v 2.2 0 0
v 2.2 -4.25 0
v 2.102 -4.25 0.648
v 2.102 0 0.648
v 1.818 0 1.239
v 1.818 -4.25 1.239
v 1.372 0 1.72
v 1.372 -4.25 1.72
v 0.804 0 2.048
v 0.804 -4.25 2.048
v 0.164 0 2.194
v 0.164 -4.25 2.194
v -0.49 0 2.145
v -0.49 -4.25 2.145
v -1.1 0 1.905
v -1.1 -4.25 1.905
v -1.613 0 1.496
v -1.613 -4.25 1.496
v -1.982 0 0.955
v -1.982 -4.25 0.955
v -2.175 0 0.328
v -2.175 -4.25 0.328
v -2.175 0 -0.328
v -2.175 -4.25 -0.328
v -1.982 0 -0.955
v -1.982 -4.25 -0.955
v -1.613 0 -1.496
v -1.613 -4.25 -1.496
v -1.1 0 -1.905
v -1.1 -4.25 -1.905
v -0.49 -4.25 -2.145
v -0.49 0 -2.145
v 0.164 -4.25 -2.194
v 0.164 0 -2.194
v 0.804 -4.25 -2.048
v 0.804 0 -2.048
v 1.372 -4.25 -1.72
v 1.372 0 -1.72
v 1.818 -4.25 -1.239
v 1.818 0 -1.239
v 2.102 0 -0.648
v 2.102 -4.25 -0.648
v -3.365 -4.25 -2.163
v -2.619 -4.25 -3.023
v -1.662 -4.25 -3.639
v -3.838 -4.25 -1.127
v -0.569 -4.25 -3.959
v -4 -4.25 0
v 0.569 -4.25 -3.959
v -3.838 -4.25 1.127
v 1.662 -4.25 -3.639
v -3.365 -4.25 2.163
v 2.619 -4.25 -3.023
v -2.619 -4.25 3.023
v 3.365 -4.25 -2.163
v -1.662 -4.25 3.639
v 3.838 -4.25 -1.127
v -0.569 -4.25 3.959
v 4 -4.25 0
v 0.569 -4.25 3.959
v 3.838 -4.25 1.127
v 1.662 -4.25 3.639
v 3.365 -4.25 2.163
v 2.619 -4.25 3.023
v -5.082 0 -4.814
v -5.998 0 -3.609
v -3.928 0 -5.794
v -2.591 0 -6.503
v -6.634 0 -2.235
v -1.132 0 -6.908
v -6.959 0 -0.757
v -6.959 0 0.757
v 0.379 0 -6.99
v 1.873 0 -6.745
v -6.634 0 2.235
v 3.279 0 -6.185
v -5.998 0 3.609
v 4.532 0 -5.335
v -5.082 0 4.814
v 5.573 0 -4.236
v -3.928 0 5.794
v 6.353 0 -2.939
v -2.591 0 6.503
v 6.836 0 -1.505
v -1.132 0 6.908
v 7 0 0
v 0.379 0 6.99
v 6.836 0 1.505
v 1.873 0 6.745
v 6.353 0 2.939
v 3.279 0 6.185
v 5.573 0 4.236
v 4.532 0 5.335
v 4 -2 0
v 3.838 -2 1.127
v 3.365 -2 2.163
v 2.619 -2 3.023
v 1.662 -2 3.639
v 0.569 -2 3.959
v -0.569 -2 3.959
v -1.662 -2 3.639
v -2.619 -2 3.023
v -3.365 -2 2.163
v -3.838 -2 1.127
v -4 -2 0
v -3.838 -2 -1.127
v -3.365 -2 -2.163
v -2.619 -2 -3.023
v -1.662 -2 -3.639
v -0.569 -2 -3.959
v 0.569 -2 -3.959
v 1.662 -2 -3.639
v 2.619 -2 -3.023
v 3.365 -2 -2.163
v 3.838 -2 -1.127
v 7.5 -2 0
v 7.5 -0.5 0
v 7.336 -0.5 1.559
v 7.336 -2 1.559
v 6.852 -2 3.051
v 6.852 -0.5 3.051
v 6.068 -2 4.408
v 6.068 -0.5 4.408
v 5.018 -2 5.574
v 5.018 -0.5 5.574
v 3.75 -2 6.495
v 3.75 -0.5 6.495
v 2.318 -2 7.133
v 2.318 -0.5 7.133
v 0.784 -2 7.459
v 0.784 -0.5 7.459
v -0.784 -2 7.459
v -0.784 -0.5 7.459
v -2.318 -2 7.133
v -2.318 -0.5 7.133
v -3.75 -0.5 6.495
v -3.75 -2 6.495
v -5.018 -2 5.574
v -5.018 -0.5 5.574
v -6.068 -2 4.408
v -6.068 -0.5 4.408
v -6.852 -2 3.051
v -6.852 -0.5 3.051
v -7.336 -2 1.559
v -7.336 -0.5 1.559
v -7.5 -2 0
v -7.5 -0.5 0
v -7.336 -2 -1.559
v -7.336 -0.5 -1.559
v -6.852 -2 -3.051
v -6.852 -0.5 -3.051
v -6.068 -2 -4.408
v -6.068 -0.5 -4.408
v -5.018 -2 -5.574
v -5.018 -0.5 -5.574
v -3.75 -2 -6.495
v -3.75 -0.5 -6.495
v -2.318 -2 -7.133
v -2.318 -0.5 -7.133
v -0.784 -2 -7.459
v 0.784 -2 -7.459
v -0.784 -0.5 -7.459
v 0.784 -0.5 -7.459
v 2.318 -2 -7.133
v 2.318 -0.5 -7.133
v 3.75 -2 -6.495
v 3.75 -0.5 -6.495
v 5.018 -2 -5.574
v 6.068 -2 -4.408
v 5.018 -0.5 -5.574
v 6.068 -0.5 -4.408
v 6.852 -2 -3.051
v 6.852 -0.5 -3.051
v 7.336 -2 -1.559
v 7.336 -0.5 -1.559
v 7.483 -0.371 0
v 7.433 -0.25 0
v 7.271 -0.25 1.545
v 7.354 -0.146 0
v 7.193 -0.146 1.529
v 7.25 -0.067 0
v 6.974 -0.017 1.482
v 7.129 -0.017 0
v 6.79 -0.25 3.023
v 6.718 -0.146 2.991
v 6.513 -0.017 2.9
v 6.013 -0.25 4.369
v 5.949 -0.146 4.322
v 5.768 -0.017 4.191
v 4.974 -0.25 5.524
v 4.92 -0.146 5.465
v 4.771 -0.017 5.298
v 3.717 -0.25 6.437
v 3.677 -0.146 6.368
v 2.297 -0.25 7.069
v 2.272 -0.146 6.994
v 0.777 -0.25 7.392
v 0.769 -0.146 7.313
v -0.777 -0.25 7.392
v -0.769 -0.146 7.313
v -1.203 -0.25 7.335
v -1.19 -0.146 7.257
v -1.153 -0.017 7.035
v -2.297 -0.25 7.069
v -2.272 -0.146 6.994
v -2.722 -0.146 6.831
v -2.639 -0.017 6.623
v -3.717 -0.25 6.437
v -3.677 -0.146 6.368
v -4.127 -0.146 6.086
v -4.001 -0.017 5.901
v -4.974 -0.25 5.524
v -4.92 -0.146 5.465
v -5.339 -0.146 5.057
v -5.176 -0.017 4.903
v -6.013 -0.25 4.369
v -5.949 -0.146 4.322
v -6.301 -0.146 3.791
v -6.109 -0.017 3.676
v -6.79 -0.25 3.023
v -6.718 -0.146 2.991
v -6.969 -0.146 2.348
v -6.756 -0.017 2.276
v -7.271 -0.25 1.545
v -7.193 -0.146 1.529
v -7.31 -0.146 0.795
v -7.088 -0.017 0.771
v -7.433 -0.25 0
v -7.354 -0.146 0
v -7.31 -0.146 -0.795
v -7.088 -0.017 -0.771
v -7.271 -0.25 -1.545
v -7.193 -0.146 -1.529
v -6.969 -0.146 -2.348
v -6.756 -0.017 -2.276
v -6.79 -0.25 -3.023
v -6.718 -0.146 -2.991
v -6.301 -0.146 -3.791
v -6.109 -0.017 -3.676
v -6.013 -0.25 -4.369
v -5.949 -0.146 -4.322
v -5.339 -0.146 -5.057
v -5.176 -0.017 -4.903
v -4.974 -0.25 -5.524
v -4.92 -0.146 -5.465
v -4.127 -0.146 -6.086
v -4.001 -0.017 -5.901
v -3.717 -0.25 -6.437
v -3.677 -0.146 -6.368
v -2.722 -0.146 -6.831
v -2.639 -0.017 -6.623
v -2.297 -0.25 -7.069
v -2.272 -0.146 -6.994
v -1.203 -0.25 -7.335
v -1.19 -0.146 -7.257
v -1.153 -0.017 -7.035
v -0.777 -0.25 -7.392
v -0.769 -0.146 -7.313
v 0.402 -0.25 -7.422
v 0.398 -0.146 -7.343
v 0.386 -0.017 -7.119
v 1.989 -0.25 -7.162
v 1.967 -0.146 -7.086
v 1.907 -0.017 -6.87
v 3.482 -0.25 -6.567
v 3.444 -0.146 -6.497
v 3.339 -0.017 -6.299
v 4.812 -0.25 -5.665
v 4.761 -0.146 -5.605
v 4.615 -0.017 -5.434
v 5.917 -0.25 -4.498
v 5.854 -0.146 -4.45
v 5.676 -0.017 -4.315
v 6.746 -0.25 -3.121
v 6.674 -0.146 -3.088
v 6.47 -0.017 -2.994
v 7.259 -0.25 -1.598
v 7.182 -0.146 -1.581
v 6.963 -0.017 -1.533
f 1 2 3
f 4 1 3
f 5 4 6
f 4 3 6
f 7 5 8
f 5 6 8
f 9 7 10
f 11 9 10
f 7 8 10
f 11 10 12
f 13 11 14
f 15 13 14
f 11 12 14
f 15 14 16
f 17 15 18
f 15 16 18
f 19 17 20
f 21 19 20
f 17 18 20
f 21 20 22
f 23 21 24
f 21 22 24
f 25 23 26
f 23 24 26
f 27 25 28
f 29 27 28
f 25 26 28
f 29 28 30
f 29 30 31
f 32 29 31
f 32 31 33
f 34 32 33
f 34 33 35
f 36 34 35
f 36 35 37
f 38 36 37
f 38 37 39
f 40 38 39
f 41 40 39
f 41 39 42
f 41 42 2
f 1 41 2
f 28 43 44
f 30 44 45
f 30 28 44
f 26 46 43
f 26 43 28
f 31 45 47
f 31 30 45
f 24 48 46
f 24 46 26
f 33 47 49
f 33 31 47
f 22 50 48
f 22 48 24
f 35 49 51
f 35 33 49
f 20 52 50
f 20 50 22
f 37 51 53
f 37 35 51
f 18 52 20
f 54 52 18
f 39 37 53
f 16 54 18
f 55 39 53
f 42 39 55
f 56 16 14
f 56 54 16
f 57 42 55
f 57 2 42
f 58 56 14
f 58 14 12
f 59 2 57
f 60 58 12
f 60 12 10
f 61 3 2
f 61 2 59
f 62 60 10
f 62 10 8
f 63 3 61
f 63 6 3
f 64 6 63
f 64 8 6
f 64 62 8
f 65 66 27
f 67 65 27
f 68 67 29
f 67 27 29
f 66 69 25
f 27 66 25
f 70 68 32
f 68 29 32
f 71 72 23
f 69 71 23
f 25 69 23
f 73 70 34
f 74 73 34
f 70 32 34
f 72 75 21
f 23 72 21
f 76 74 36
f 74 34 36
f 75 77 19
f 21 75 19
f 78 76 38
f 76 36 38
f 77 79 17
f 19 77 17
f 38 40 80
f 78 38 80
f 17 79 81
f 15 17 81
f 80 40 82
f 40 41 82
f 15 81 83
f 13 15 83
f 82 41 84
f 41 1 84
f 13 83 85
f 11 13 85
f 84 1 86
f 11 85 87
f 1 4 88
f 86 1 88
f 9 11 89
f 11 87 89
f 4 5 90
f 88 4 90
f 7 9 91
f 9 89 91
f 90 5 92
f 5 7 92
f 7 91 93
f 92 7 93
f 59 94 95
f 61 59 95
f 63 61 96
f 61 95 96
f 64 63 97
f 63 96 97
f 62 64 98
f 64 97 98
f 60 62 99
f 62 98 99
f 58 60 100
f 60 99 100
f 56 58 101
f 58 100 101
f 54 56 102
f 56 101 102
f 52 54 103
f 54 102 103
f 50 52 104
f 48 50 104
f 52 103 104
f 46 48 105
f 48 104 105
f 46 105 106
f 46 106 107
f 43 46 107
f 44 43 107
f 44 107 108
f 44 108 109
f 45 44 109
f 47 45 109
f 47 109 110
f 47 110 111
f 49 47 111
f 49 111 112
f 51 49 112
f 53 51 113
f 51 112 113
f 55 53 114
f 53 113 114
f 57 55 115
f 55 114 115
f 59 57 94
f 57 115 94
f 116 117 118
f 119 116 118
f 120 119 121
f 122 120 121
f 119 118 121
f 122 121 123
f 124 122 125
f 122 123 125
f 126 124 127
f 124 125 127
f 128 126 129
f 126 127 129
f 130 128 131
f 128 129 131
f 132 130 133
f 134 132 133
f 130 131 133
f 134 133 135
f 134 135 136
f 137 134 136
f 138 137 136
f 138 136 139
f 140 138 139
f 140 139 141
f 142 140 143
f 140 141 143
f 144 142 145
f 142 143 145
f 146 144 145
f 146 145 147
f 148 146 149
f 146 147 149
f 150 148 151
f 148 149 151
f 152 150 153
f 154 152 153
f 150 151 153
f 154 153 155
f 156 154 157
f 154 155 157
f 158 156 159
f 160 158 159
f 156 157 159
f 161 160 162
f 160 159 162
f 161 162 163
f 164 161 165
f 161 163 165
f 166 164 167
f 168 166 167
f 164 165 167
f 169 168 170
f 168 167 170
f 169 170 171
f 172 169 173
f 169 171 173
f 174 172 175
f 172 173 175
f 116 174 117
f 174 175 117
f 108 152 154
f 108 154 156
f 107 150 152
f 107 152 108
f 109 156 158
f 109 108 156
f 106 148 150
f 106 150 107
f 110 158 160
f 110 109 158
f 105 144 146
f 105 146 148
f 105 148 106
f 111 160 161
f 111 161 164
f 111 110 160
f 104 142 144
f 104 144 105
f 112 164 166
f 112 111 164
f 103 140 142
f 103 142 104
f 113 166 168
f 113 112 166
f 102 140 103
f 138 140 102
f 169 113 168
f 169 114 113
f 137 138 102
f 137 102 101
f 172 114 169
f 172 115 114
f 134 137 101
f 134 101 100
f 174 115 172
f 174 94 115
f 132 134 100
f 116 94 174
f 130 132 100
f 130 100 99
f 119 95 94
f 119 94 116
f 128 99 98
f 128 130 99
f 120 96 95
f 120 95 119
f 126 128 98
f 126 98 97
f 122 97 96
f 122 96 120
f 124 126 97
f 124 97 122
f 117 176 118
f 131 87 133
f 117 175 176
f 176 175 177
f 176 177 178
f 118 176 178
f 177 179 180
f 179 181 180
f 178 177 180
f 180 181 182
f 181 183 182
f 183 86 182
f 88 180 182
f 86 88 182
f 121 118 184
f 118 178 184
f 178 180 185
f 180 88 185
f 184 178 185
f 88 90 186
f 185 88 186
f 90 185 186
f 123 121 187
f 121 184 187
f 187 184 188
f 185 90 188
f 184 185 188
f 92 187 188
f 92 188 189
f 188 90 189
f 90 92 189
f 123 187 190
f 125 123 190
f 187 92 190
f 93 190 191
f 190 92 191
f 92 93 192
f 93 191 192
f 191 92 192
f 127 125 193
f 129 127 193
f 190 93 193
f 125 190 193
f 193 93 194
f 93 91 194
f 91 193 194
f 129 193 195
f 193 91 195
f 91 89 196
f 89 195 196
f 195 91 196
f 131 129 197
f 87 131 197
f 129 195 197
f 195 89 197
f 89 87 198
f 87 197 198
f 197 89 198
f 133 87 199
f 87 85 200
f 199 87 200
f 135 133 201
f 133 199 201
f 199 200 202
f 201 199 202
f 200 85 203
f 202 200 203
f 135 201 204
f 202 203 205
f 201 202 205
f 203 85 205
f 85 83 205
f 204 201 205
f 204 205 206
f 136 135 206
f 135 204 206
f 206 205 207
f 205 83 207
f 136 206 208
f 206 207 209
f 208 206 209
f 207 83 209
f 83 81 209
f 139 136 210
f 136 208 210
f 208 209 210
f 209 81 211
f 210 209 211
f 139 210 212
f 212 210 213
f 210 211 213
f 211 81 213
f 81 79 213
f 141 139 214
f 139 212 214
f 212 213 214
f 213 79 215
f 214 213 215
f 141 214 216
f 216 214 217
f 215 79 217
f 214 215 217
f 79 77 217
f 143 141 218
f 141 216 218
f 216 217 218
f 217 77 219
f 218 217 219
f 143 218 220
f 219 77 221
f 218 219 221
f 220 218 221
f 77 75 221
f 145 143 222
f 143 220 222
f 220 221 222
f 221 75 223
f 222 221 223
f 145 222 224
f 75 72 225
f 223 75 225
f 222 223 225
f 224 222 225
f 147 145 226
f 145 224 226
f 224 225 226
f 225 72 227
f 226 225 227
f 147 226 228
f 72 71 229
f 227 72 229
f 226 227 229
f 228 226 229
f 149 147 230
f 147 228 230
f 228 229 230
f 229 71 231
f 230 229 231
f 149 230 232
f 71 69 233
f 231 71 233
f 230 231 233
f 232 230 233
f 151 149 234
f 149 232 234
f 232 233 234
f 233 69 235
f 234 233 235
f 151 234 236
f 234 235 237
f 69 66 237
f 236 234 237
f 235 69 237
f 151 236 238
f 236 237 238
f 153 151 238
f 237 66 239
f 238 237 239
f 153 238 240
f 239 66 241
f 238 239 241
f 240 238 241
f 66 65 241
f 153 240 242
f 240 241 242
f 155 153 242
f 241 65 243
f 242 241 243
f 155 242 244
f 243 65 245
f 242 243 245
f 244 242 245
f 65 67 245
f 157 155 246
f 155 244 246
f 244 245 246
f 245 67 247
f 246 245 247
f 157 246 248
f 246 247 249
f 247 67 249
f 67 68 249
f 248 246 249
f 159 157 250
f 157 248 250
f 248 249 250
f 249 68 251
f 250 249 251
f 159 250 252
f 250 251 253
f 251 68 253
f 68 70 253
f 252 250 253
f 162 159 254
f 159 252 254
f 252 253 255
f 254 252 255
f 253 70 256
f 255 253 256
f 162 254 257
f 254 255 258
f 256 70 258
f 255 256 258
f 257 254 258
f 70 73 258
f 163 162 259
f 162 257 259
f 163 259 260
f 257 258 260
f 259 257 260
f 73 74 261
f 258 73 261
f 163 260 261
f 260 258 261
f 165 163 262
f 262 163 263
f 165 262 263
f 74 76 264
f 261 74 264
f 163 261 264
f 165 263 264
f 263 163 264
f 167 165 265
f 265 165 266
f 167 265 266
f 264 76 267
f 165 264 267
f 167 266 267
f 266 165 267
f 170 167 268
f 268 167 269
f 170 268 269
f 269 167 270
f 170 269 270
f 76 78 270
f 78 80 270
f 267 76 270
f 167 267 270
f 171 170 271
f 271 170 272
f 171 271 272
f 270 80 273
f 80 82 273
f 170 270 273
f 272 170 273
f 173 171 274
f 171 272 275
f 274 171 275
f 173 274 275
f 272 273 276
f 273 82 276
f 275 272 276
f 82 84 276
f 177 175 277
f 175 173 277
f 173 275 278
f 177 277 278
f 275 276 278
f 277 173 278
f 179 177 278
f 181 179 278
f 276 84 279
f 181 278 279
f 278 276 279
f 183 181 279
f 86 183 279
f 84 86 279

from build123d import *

# Parameters (mm, degrees)
F0_R     = 7.5
F1_DEPTH = 2
F2_R     = 4
F3_DEPTH = 2.25
F4_R     = 2.2
F5_DEPTH = 4.251
F6_R     = 0.5


with BuildPart() as f1:
    # F0 (on Front) → F1 (new body)
    with BuildSketch(Plane.XZ):
        Circle(F0_R)
    extrude(amount=F1_DEPTH)

    # F2 (on face) → F3 (join)
    with BuildSketch(Plane.XZ.offset(2)):
        Circle(F2_R)
    extrude(amount=F3_DEPTH)

    # F4 (on face) → F5 (cut, through all)
    with BuildSketch(Plane.XZ.offset(4.25)):
        Circle(F4_R)
    extrude(amount=-F5_DEPTH, mode=Mode.SUBTRACT)

    # F6
    f6_edges = [f1.edges().sort_by_distance(p)[0] for p in [
        (-7.5, 0, 0),
    ]]
    fillet(f6_edges, radius=F6_R)


solid = f1.part
